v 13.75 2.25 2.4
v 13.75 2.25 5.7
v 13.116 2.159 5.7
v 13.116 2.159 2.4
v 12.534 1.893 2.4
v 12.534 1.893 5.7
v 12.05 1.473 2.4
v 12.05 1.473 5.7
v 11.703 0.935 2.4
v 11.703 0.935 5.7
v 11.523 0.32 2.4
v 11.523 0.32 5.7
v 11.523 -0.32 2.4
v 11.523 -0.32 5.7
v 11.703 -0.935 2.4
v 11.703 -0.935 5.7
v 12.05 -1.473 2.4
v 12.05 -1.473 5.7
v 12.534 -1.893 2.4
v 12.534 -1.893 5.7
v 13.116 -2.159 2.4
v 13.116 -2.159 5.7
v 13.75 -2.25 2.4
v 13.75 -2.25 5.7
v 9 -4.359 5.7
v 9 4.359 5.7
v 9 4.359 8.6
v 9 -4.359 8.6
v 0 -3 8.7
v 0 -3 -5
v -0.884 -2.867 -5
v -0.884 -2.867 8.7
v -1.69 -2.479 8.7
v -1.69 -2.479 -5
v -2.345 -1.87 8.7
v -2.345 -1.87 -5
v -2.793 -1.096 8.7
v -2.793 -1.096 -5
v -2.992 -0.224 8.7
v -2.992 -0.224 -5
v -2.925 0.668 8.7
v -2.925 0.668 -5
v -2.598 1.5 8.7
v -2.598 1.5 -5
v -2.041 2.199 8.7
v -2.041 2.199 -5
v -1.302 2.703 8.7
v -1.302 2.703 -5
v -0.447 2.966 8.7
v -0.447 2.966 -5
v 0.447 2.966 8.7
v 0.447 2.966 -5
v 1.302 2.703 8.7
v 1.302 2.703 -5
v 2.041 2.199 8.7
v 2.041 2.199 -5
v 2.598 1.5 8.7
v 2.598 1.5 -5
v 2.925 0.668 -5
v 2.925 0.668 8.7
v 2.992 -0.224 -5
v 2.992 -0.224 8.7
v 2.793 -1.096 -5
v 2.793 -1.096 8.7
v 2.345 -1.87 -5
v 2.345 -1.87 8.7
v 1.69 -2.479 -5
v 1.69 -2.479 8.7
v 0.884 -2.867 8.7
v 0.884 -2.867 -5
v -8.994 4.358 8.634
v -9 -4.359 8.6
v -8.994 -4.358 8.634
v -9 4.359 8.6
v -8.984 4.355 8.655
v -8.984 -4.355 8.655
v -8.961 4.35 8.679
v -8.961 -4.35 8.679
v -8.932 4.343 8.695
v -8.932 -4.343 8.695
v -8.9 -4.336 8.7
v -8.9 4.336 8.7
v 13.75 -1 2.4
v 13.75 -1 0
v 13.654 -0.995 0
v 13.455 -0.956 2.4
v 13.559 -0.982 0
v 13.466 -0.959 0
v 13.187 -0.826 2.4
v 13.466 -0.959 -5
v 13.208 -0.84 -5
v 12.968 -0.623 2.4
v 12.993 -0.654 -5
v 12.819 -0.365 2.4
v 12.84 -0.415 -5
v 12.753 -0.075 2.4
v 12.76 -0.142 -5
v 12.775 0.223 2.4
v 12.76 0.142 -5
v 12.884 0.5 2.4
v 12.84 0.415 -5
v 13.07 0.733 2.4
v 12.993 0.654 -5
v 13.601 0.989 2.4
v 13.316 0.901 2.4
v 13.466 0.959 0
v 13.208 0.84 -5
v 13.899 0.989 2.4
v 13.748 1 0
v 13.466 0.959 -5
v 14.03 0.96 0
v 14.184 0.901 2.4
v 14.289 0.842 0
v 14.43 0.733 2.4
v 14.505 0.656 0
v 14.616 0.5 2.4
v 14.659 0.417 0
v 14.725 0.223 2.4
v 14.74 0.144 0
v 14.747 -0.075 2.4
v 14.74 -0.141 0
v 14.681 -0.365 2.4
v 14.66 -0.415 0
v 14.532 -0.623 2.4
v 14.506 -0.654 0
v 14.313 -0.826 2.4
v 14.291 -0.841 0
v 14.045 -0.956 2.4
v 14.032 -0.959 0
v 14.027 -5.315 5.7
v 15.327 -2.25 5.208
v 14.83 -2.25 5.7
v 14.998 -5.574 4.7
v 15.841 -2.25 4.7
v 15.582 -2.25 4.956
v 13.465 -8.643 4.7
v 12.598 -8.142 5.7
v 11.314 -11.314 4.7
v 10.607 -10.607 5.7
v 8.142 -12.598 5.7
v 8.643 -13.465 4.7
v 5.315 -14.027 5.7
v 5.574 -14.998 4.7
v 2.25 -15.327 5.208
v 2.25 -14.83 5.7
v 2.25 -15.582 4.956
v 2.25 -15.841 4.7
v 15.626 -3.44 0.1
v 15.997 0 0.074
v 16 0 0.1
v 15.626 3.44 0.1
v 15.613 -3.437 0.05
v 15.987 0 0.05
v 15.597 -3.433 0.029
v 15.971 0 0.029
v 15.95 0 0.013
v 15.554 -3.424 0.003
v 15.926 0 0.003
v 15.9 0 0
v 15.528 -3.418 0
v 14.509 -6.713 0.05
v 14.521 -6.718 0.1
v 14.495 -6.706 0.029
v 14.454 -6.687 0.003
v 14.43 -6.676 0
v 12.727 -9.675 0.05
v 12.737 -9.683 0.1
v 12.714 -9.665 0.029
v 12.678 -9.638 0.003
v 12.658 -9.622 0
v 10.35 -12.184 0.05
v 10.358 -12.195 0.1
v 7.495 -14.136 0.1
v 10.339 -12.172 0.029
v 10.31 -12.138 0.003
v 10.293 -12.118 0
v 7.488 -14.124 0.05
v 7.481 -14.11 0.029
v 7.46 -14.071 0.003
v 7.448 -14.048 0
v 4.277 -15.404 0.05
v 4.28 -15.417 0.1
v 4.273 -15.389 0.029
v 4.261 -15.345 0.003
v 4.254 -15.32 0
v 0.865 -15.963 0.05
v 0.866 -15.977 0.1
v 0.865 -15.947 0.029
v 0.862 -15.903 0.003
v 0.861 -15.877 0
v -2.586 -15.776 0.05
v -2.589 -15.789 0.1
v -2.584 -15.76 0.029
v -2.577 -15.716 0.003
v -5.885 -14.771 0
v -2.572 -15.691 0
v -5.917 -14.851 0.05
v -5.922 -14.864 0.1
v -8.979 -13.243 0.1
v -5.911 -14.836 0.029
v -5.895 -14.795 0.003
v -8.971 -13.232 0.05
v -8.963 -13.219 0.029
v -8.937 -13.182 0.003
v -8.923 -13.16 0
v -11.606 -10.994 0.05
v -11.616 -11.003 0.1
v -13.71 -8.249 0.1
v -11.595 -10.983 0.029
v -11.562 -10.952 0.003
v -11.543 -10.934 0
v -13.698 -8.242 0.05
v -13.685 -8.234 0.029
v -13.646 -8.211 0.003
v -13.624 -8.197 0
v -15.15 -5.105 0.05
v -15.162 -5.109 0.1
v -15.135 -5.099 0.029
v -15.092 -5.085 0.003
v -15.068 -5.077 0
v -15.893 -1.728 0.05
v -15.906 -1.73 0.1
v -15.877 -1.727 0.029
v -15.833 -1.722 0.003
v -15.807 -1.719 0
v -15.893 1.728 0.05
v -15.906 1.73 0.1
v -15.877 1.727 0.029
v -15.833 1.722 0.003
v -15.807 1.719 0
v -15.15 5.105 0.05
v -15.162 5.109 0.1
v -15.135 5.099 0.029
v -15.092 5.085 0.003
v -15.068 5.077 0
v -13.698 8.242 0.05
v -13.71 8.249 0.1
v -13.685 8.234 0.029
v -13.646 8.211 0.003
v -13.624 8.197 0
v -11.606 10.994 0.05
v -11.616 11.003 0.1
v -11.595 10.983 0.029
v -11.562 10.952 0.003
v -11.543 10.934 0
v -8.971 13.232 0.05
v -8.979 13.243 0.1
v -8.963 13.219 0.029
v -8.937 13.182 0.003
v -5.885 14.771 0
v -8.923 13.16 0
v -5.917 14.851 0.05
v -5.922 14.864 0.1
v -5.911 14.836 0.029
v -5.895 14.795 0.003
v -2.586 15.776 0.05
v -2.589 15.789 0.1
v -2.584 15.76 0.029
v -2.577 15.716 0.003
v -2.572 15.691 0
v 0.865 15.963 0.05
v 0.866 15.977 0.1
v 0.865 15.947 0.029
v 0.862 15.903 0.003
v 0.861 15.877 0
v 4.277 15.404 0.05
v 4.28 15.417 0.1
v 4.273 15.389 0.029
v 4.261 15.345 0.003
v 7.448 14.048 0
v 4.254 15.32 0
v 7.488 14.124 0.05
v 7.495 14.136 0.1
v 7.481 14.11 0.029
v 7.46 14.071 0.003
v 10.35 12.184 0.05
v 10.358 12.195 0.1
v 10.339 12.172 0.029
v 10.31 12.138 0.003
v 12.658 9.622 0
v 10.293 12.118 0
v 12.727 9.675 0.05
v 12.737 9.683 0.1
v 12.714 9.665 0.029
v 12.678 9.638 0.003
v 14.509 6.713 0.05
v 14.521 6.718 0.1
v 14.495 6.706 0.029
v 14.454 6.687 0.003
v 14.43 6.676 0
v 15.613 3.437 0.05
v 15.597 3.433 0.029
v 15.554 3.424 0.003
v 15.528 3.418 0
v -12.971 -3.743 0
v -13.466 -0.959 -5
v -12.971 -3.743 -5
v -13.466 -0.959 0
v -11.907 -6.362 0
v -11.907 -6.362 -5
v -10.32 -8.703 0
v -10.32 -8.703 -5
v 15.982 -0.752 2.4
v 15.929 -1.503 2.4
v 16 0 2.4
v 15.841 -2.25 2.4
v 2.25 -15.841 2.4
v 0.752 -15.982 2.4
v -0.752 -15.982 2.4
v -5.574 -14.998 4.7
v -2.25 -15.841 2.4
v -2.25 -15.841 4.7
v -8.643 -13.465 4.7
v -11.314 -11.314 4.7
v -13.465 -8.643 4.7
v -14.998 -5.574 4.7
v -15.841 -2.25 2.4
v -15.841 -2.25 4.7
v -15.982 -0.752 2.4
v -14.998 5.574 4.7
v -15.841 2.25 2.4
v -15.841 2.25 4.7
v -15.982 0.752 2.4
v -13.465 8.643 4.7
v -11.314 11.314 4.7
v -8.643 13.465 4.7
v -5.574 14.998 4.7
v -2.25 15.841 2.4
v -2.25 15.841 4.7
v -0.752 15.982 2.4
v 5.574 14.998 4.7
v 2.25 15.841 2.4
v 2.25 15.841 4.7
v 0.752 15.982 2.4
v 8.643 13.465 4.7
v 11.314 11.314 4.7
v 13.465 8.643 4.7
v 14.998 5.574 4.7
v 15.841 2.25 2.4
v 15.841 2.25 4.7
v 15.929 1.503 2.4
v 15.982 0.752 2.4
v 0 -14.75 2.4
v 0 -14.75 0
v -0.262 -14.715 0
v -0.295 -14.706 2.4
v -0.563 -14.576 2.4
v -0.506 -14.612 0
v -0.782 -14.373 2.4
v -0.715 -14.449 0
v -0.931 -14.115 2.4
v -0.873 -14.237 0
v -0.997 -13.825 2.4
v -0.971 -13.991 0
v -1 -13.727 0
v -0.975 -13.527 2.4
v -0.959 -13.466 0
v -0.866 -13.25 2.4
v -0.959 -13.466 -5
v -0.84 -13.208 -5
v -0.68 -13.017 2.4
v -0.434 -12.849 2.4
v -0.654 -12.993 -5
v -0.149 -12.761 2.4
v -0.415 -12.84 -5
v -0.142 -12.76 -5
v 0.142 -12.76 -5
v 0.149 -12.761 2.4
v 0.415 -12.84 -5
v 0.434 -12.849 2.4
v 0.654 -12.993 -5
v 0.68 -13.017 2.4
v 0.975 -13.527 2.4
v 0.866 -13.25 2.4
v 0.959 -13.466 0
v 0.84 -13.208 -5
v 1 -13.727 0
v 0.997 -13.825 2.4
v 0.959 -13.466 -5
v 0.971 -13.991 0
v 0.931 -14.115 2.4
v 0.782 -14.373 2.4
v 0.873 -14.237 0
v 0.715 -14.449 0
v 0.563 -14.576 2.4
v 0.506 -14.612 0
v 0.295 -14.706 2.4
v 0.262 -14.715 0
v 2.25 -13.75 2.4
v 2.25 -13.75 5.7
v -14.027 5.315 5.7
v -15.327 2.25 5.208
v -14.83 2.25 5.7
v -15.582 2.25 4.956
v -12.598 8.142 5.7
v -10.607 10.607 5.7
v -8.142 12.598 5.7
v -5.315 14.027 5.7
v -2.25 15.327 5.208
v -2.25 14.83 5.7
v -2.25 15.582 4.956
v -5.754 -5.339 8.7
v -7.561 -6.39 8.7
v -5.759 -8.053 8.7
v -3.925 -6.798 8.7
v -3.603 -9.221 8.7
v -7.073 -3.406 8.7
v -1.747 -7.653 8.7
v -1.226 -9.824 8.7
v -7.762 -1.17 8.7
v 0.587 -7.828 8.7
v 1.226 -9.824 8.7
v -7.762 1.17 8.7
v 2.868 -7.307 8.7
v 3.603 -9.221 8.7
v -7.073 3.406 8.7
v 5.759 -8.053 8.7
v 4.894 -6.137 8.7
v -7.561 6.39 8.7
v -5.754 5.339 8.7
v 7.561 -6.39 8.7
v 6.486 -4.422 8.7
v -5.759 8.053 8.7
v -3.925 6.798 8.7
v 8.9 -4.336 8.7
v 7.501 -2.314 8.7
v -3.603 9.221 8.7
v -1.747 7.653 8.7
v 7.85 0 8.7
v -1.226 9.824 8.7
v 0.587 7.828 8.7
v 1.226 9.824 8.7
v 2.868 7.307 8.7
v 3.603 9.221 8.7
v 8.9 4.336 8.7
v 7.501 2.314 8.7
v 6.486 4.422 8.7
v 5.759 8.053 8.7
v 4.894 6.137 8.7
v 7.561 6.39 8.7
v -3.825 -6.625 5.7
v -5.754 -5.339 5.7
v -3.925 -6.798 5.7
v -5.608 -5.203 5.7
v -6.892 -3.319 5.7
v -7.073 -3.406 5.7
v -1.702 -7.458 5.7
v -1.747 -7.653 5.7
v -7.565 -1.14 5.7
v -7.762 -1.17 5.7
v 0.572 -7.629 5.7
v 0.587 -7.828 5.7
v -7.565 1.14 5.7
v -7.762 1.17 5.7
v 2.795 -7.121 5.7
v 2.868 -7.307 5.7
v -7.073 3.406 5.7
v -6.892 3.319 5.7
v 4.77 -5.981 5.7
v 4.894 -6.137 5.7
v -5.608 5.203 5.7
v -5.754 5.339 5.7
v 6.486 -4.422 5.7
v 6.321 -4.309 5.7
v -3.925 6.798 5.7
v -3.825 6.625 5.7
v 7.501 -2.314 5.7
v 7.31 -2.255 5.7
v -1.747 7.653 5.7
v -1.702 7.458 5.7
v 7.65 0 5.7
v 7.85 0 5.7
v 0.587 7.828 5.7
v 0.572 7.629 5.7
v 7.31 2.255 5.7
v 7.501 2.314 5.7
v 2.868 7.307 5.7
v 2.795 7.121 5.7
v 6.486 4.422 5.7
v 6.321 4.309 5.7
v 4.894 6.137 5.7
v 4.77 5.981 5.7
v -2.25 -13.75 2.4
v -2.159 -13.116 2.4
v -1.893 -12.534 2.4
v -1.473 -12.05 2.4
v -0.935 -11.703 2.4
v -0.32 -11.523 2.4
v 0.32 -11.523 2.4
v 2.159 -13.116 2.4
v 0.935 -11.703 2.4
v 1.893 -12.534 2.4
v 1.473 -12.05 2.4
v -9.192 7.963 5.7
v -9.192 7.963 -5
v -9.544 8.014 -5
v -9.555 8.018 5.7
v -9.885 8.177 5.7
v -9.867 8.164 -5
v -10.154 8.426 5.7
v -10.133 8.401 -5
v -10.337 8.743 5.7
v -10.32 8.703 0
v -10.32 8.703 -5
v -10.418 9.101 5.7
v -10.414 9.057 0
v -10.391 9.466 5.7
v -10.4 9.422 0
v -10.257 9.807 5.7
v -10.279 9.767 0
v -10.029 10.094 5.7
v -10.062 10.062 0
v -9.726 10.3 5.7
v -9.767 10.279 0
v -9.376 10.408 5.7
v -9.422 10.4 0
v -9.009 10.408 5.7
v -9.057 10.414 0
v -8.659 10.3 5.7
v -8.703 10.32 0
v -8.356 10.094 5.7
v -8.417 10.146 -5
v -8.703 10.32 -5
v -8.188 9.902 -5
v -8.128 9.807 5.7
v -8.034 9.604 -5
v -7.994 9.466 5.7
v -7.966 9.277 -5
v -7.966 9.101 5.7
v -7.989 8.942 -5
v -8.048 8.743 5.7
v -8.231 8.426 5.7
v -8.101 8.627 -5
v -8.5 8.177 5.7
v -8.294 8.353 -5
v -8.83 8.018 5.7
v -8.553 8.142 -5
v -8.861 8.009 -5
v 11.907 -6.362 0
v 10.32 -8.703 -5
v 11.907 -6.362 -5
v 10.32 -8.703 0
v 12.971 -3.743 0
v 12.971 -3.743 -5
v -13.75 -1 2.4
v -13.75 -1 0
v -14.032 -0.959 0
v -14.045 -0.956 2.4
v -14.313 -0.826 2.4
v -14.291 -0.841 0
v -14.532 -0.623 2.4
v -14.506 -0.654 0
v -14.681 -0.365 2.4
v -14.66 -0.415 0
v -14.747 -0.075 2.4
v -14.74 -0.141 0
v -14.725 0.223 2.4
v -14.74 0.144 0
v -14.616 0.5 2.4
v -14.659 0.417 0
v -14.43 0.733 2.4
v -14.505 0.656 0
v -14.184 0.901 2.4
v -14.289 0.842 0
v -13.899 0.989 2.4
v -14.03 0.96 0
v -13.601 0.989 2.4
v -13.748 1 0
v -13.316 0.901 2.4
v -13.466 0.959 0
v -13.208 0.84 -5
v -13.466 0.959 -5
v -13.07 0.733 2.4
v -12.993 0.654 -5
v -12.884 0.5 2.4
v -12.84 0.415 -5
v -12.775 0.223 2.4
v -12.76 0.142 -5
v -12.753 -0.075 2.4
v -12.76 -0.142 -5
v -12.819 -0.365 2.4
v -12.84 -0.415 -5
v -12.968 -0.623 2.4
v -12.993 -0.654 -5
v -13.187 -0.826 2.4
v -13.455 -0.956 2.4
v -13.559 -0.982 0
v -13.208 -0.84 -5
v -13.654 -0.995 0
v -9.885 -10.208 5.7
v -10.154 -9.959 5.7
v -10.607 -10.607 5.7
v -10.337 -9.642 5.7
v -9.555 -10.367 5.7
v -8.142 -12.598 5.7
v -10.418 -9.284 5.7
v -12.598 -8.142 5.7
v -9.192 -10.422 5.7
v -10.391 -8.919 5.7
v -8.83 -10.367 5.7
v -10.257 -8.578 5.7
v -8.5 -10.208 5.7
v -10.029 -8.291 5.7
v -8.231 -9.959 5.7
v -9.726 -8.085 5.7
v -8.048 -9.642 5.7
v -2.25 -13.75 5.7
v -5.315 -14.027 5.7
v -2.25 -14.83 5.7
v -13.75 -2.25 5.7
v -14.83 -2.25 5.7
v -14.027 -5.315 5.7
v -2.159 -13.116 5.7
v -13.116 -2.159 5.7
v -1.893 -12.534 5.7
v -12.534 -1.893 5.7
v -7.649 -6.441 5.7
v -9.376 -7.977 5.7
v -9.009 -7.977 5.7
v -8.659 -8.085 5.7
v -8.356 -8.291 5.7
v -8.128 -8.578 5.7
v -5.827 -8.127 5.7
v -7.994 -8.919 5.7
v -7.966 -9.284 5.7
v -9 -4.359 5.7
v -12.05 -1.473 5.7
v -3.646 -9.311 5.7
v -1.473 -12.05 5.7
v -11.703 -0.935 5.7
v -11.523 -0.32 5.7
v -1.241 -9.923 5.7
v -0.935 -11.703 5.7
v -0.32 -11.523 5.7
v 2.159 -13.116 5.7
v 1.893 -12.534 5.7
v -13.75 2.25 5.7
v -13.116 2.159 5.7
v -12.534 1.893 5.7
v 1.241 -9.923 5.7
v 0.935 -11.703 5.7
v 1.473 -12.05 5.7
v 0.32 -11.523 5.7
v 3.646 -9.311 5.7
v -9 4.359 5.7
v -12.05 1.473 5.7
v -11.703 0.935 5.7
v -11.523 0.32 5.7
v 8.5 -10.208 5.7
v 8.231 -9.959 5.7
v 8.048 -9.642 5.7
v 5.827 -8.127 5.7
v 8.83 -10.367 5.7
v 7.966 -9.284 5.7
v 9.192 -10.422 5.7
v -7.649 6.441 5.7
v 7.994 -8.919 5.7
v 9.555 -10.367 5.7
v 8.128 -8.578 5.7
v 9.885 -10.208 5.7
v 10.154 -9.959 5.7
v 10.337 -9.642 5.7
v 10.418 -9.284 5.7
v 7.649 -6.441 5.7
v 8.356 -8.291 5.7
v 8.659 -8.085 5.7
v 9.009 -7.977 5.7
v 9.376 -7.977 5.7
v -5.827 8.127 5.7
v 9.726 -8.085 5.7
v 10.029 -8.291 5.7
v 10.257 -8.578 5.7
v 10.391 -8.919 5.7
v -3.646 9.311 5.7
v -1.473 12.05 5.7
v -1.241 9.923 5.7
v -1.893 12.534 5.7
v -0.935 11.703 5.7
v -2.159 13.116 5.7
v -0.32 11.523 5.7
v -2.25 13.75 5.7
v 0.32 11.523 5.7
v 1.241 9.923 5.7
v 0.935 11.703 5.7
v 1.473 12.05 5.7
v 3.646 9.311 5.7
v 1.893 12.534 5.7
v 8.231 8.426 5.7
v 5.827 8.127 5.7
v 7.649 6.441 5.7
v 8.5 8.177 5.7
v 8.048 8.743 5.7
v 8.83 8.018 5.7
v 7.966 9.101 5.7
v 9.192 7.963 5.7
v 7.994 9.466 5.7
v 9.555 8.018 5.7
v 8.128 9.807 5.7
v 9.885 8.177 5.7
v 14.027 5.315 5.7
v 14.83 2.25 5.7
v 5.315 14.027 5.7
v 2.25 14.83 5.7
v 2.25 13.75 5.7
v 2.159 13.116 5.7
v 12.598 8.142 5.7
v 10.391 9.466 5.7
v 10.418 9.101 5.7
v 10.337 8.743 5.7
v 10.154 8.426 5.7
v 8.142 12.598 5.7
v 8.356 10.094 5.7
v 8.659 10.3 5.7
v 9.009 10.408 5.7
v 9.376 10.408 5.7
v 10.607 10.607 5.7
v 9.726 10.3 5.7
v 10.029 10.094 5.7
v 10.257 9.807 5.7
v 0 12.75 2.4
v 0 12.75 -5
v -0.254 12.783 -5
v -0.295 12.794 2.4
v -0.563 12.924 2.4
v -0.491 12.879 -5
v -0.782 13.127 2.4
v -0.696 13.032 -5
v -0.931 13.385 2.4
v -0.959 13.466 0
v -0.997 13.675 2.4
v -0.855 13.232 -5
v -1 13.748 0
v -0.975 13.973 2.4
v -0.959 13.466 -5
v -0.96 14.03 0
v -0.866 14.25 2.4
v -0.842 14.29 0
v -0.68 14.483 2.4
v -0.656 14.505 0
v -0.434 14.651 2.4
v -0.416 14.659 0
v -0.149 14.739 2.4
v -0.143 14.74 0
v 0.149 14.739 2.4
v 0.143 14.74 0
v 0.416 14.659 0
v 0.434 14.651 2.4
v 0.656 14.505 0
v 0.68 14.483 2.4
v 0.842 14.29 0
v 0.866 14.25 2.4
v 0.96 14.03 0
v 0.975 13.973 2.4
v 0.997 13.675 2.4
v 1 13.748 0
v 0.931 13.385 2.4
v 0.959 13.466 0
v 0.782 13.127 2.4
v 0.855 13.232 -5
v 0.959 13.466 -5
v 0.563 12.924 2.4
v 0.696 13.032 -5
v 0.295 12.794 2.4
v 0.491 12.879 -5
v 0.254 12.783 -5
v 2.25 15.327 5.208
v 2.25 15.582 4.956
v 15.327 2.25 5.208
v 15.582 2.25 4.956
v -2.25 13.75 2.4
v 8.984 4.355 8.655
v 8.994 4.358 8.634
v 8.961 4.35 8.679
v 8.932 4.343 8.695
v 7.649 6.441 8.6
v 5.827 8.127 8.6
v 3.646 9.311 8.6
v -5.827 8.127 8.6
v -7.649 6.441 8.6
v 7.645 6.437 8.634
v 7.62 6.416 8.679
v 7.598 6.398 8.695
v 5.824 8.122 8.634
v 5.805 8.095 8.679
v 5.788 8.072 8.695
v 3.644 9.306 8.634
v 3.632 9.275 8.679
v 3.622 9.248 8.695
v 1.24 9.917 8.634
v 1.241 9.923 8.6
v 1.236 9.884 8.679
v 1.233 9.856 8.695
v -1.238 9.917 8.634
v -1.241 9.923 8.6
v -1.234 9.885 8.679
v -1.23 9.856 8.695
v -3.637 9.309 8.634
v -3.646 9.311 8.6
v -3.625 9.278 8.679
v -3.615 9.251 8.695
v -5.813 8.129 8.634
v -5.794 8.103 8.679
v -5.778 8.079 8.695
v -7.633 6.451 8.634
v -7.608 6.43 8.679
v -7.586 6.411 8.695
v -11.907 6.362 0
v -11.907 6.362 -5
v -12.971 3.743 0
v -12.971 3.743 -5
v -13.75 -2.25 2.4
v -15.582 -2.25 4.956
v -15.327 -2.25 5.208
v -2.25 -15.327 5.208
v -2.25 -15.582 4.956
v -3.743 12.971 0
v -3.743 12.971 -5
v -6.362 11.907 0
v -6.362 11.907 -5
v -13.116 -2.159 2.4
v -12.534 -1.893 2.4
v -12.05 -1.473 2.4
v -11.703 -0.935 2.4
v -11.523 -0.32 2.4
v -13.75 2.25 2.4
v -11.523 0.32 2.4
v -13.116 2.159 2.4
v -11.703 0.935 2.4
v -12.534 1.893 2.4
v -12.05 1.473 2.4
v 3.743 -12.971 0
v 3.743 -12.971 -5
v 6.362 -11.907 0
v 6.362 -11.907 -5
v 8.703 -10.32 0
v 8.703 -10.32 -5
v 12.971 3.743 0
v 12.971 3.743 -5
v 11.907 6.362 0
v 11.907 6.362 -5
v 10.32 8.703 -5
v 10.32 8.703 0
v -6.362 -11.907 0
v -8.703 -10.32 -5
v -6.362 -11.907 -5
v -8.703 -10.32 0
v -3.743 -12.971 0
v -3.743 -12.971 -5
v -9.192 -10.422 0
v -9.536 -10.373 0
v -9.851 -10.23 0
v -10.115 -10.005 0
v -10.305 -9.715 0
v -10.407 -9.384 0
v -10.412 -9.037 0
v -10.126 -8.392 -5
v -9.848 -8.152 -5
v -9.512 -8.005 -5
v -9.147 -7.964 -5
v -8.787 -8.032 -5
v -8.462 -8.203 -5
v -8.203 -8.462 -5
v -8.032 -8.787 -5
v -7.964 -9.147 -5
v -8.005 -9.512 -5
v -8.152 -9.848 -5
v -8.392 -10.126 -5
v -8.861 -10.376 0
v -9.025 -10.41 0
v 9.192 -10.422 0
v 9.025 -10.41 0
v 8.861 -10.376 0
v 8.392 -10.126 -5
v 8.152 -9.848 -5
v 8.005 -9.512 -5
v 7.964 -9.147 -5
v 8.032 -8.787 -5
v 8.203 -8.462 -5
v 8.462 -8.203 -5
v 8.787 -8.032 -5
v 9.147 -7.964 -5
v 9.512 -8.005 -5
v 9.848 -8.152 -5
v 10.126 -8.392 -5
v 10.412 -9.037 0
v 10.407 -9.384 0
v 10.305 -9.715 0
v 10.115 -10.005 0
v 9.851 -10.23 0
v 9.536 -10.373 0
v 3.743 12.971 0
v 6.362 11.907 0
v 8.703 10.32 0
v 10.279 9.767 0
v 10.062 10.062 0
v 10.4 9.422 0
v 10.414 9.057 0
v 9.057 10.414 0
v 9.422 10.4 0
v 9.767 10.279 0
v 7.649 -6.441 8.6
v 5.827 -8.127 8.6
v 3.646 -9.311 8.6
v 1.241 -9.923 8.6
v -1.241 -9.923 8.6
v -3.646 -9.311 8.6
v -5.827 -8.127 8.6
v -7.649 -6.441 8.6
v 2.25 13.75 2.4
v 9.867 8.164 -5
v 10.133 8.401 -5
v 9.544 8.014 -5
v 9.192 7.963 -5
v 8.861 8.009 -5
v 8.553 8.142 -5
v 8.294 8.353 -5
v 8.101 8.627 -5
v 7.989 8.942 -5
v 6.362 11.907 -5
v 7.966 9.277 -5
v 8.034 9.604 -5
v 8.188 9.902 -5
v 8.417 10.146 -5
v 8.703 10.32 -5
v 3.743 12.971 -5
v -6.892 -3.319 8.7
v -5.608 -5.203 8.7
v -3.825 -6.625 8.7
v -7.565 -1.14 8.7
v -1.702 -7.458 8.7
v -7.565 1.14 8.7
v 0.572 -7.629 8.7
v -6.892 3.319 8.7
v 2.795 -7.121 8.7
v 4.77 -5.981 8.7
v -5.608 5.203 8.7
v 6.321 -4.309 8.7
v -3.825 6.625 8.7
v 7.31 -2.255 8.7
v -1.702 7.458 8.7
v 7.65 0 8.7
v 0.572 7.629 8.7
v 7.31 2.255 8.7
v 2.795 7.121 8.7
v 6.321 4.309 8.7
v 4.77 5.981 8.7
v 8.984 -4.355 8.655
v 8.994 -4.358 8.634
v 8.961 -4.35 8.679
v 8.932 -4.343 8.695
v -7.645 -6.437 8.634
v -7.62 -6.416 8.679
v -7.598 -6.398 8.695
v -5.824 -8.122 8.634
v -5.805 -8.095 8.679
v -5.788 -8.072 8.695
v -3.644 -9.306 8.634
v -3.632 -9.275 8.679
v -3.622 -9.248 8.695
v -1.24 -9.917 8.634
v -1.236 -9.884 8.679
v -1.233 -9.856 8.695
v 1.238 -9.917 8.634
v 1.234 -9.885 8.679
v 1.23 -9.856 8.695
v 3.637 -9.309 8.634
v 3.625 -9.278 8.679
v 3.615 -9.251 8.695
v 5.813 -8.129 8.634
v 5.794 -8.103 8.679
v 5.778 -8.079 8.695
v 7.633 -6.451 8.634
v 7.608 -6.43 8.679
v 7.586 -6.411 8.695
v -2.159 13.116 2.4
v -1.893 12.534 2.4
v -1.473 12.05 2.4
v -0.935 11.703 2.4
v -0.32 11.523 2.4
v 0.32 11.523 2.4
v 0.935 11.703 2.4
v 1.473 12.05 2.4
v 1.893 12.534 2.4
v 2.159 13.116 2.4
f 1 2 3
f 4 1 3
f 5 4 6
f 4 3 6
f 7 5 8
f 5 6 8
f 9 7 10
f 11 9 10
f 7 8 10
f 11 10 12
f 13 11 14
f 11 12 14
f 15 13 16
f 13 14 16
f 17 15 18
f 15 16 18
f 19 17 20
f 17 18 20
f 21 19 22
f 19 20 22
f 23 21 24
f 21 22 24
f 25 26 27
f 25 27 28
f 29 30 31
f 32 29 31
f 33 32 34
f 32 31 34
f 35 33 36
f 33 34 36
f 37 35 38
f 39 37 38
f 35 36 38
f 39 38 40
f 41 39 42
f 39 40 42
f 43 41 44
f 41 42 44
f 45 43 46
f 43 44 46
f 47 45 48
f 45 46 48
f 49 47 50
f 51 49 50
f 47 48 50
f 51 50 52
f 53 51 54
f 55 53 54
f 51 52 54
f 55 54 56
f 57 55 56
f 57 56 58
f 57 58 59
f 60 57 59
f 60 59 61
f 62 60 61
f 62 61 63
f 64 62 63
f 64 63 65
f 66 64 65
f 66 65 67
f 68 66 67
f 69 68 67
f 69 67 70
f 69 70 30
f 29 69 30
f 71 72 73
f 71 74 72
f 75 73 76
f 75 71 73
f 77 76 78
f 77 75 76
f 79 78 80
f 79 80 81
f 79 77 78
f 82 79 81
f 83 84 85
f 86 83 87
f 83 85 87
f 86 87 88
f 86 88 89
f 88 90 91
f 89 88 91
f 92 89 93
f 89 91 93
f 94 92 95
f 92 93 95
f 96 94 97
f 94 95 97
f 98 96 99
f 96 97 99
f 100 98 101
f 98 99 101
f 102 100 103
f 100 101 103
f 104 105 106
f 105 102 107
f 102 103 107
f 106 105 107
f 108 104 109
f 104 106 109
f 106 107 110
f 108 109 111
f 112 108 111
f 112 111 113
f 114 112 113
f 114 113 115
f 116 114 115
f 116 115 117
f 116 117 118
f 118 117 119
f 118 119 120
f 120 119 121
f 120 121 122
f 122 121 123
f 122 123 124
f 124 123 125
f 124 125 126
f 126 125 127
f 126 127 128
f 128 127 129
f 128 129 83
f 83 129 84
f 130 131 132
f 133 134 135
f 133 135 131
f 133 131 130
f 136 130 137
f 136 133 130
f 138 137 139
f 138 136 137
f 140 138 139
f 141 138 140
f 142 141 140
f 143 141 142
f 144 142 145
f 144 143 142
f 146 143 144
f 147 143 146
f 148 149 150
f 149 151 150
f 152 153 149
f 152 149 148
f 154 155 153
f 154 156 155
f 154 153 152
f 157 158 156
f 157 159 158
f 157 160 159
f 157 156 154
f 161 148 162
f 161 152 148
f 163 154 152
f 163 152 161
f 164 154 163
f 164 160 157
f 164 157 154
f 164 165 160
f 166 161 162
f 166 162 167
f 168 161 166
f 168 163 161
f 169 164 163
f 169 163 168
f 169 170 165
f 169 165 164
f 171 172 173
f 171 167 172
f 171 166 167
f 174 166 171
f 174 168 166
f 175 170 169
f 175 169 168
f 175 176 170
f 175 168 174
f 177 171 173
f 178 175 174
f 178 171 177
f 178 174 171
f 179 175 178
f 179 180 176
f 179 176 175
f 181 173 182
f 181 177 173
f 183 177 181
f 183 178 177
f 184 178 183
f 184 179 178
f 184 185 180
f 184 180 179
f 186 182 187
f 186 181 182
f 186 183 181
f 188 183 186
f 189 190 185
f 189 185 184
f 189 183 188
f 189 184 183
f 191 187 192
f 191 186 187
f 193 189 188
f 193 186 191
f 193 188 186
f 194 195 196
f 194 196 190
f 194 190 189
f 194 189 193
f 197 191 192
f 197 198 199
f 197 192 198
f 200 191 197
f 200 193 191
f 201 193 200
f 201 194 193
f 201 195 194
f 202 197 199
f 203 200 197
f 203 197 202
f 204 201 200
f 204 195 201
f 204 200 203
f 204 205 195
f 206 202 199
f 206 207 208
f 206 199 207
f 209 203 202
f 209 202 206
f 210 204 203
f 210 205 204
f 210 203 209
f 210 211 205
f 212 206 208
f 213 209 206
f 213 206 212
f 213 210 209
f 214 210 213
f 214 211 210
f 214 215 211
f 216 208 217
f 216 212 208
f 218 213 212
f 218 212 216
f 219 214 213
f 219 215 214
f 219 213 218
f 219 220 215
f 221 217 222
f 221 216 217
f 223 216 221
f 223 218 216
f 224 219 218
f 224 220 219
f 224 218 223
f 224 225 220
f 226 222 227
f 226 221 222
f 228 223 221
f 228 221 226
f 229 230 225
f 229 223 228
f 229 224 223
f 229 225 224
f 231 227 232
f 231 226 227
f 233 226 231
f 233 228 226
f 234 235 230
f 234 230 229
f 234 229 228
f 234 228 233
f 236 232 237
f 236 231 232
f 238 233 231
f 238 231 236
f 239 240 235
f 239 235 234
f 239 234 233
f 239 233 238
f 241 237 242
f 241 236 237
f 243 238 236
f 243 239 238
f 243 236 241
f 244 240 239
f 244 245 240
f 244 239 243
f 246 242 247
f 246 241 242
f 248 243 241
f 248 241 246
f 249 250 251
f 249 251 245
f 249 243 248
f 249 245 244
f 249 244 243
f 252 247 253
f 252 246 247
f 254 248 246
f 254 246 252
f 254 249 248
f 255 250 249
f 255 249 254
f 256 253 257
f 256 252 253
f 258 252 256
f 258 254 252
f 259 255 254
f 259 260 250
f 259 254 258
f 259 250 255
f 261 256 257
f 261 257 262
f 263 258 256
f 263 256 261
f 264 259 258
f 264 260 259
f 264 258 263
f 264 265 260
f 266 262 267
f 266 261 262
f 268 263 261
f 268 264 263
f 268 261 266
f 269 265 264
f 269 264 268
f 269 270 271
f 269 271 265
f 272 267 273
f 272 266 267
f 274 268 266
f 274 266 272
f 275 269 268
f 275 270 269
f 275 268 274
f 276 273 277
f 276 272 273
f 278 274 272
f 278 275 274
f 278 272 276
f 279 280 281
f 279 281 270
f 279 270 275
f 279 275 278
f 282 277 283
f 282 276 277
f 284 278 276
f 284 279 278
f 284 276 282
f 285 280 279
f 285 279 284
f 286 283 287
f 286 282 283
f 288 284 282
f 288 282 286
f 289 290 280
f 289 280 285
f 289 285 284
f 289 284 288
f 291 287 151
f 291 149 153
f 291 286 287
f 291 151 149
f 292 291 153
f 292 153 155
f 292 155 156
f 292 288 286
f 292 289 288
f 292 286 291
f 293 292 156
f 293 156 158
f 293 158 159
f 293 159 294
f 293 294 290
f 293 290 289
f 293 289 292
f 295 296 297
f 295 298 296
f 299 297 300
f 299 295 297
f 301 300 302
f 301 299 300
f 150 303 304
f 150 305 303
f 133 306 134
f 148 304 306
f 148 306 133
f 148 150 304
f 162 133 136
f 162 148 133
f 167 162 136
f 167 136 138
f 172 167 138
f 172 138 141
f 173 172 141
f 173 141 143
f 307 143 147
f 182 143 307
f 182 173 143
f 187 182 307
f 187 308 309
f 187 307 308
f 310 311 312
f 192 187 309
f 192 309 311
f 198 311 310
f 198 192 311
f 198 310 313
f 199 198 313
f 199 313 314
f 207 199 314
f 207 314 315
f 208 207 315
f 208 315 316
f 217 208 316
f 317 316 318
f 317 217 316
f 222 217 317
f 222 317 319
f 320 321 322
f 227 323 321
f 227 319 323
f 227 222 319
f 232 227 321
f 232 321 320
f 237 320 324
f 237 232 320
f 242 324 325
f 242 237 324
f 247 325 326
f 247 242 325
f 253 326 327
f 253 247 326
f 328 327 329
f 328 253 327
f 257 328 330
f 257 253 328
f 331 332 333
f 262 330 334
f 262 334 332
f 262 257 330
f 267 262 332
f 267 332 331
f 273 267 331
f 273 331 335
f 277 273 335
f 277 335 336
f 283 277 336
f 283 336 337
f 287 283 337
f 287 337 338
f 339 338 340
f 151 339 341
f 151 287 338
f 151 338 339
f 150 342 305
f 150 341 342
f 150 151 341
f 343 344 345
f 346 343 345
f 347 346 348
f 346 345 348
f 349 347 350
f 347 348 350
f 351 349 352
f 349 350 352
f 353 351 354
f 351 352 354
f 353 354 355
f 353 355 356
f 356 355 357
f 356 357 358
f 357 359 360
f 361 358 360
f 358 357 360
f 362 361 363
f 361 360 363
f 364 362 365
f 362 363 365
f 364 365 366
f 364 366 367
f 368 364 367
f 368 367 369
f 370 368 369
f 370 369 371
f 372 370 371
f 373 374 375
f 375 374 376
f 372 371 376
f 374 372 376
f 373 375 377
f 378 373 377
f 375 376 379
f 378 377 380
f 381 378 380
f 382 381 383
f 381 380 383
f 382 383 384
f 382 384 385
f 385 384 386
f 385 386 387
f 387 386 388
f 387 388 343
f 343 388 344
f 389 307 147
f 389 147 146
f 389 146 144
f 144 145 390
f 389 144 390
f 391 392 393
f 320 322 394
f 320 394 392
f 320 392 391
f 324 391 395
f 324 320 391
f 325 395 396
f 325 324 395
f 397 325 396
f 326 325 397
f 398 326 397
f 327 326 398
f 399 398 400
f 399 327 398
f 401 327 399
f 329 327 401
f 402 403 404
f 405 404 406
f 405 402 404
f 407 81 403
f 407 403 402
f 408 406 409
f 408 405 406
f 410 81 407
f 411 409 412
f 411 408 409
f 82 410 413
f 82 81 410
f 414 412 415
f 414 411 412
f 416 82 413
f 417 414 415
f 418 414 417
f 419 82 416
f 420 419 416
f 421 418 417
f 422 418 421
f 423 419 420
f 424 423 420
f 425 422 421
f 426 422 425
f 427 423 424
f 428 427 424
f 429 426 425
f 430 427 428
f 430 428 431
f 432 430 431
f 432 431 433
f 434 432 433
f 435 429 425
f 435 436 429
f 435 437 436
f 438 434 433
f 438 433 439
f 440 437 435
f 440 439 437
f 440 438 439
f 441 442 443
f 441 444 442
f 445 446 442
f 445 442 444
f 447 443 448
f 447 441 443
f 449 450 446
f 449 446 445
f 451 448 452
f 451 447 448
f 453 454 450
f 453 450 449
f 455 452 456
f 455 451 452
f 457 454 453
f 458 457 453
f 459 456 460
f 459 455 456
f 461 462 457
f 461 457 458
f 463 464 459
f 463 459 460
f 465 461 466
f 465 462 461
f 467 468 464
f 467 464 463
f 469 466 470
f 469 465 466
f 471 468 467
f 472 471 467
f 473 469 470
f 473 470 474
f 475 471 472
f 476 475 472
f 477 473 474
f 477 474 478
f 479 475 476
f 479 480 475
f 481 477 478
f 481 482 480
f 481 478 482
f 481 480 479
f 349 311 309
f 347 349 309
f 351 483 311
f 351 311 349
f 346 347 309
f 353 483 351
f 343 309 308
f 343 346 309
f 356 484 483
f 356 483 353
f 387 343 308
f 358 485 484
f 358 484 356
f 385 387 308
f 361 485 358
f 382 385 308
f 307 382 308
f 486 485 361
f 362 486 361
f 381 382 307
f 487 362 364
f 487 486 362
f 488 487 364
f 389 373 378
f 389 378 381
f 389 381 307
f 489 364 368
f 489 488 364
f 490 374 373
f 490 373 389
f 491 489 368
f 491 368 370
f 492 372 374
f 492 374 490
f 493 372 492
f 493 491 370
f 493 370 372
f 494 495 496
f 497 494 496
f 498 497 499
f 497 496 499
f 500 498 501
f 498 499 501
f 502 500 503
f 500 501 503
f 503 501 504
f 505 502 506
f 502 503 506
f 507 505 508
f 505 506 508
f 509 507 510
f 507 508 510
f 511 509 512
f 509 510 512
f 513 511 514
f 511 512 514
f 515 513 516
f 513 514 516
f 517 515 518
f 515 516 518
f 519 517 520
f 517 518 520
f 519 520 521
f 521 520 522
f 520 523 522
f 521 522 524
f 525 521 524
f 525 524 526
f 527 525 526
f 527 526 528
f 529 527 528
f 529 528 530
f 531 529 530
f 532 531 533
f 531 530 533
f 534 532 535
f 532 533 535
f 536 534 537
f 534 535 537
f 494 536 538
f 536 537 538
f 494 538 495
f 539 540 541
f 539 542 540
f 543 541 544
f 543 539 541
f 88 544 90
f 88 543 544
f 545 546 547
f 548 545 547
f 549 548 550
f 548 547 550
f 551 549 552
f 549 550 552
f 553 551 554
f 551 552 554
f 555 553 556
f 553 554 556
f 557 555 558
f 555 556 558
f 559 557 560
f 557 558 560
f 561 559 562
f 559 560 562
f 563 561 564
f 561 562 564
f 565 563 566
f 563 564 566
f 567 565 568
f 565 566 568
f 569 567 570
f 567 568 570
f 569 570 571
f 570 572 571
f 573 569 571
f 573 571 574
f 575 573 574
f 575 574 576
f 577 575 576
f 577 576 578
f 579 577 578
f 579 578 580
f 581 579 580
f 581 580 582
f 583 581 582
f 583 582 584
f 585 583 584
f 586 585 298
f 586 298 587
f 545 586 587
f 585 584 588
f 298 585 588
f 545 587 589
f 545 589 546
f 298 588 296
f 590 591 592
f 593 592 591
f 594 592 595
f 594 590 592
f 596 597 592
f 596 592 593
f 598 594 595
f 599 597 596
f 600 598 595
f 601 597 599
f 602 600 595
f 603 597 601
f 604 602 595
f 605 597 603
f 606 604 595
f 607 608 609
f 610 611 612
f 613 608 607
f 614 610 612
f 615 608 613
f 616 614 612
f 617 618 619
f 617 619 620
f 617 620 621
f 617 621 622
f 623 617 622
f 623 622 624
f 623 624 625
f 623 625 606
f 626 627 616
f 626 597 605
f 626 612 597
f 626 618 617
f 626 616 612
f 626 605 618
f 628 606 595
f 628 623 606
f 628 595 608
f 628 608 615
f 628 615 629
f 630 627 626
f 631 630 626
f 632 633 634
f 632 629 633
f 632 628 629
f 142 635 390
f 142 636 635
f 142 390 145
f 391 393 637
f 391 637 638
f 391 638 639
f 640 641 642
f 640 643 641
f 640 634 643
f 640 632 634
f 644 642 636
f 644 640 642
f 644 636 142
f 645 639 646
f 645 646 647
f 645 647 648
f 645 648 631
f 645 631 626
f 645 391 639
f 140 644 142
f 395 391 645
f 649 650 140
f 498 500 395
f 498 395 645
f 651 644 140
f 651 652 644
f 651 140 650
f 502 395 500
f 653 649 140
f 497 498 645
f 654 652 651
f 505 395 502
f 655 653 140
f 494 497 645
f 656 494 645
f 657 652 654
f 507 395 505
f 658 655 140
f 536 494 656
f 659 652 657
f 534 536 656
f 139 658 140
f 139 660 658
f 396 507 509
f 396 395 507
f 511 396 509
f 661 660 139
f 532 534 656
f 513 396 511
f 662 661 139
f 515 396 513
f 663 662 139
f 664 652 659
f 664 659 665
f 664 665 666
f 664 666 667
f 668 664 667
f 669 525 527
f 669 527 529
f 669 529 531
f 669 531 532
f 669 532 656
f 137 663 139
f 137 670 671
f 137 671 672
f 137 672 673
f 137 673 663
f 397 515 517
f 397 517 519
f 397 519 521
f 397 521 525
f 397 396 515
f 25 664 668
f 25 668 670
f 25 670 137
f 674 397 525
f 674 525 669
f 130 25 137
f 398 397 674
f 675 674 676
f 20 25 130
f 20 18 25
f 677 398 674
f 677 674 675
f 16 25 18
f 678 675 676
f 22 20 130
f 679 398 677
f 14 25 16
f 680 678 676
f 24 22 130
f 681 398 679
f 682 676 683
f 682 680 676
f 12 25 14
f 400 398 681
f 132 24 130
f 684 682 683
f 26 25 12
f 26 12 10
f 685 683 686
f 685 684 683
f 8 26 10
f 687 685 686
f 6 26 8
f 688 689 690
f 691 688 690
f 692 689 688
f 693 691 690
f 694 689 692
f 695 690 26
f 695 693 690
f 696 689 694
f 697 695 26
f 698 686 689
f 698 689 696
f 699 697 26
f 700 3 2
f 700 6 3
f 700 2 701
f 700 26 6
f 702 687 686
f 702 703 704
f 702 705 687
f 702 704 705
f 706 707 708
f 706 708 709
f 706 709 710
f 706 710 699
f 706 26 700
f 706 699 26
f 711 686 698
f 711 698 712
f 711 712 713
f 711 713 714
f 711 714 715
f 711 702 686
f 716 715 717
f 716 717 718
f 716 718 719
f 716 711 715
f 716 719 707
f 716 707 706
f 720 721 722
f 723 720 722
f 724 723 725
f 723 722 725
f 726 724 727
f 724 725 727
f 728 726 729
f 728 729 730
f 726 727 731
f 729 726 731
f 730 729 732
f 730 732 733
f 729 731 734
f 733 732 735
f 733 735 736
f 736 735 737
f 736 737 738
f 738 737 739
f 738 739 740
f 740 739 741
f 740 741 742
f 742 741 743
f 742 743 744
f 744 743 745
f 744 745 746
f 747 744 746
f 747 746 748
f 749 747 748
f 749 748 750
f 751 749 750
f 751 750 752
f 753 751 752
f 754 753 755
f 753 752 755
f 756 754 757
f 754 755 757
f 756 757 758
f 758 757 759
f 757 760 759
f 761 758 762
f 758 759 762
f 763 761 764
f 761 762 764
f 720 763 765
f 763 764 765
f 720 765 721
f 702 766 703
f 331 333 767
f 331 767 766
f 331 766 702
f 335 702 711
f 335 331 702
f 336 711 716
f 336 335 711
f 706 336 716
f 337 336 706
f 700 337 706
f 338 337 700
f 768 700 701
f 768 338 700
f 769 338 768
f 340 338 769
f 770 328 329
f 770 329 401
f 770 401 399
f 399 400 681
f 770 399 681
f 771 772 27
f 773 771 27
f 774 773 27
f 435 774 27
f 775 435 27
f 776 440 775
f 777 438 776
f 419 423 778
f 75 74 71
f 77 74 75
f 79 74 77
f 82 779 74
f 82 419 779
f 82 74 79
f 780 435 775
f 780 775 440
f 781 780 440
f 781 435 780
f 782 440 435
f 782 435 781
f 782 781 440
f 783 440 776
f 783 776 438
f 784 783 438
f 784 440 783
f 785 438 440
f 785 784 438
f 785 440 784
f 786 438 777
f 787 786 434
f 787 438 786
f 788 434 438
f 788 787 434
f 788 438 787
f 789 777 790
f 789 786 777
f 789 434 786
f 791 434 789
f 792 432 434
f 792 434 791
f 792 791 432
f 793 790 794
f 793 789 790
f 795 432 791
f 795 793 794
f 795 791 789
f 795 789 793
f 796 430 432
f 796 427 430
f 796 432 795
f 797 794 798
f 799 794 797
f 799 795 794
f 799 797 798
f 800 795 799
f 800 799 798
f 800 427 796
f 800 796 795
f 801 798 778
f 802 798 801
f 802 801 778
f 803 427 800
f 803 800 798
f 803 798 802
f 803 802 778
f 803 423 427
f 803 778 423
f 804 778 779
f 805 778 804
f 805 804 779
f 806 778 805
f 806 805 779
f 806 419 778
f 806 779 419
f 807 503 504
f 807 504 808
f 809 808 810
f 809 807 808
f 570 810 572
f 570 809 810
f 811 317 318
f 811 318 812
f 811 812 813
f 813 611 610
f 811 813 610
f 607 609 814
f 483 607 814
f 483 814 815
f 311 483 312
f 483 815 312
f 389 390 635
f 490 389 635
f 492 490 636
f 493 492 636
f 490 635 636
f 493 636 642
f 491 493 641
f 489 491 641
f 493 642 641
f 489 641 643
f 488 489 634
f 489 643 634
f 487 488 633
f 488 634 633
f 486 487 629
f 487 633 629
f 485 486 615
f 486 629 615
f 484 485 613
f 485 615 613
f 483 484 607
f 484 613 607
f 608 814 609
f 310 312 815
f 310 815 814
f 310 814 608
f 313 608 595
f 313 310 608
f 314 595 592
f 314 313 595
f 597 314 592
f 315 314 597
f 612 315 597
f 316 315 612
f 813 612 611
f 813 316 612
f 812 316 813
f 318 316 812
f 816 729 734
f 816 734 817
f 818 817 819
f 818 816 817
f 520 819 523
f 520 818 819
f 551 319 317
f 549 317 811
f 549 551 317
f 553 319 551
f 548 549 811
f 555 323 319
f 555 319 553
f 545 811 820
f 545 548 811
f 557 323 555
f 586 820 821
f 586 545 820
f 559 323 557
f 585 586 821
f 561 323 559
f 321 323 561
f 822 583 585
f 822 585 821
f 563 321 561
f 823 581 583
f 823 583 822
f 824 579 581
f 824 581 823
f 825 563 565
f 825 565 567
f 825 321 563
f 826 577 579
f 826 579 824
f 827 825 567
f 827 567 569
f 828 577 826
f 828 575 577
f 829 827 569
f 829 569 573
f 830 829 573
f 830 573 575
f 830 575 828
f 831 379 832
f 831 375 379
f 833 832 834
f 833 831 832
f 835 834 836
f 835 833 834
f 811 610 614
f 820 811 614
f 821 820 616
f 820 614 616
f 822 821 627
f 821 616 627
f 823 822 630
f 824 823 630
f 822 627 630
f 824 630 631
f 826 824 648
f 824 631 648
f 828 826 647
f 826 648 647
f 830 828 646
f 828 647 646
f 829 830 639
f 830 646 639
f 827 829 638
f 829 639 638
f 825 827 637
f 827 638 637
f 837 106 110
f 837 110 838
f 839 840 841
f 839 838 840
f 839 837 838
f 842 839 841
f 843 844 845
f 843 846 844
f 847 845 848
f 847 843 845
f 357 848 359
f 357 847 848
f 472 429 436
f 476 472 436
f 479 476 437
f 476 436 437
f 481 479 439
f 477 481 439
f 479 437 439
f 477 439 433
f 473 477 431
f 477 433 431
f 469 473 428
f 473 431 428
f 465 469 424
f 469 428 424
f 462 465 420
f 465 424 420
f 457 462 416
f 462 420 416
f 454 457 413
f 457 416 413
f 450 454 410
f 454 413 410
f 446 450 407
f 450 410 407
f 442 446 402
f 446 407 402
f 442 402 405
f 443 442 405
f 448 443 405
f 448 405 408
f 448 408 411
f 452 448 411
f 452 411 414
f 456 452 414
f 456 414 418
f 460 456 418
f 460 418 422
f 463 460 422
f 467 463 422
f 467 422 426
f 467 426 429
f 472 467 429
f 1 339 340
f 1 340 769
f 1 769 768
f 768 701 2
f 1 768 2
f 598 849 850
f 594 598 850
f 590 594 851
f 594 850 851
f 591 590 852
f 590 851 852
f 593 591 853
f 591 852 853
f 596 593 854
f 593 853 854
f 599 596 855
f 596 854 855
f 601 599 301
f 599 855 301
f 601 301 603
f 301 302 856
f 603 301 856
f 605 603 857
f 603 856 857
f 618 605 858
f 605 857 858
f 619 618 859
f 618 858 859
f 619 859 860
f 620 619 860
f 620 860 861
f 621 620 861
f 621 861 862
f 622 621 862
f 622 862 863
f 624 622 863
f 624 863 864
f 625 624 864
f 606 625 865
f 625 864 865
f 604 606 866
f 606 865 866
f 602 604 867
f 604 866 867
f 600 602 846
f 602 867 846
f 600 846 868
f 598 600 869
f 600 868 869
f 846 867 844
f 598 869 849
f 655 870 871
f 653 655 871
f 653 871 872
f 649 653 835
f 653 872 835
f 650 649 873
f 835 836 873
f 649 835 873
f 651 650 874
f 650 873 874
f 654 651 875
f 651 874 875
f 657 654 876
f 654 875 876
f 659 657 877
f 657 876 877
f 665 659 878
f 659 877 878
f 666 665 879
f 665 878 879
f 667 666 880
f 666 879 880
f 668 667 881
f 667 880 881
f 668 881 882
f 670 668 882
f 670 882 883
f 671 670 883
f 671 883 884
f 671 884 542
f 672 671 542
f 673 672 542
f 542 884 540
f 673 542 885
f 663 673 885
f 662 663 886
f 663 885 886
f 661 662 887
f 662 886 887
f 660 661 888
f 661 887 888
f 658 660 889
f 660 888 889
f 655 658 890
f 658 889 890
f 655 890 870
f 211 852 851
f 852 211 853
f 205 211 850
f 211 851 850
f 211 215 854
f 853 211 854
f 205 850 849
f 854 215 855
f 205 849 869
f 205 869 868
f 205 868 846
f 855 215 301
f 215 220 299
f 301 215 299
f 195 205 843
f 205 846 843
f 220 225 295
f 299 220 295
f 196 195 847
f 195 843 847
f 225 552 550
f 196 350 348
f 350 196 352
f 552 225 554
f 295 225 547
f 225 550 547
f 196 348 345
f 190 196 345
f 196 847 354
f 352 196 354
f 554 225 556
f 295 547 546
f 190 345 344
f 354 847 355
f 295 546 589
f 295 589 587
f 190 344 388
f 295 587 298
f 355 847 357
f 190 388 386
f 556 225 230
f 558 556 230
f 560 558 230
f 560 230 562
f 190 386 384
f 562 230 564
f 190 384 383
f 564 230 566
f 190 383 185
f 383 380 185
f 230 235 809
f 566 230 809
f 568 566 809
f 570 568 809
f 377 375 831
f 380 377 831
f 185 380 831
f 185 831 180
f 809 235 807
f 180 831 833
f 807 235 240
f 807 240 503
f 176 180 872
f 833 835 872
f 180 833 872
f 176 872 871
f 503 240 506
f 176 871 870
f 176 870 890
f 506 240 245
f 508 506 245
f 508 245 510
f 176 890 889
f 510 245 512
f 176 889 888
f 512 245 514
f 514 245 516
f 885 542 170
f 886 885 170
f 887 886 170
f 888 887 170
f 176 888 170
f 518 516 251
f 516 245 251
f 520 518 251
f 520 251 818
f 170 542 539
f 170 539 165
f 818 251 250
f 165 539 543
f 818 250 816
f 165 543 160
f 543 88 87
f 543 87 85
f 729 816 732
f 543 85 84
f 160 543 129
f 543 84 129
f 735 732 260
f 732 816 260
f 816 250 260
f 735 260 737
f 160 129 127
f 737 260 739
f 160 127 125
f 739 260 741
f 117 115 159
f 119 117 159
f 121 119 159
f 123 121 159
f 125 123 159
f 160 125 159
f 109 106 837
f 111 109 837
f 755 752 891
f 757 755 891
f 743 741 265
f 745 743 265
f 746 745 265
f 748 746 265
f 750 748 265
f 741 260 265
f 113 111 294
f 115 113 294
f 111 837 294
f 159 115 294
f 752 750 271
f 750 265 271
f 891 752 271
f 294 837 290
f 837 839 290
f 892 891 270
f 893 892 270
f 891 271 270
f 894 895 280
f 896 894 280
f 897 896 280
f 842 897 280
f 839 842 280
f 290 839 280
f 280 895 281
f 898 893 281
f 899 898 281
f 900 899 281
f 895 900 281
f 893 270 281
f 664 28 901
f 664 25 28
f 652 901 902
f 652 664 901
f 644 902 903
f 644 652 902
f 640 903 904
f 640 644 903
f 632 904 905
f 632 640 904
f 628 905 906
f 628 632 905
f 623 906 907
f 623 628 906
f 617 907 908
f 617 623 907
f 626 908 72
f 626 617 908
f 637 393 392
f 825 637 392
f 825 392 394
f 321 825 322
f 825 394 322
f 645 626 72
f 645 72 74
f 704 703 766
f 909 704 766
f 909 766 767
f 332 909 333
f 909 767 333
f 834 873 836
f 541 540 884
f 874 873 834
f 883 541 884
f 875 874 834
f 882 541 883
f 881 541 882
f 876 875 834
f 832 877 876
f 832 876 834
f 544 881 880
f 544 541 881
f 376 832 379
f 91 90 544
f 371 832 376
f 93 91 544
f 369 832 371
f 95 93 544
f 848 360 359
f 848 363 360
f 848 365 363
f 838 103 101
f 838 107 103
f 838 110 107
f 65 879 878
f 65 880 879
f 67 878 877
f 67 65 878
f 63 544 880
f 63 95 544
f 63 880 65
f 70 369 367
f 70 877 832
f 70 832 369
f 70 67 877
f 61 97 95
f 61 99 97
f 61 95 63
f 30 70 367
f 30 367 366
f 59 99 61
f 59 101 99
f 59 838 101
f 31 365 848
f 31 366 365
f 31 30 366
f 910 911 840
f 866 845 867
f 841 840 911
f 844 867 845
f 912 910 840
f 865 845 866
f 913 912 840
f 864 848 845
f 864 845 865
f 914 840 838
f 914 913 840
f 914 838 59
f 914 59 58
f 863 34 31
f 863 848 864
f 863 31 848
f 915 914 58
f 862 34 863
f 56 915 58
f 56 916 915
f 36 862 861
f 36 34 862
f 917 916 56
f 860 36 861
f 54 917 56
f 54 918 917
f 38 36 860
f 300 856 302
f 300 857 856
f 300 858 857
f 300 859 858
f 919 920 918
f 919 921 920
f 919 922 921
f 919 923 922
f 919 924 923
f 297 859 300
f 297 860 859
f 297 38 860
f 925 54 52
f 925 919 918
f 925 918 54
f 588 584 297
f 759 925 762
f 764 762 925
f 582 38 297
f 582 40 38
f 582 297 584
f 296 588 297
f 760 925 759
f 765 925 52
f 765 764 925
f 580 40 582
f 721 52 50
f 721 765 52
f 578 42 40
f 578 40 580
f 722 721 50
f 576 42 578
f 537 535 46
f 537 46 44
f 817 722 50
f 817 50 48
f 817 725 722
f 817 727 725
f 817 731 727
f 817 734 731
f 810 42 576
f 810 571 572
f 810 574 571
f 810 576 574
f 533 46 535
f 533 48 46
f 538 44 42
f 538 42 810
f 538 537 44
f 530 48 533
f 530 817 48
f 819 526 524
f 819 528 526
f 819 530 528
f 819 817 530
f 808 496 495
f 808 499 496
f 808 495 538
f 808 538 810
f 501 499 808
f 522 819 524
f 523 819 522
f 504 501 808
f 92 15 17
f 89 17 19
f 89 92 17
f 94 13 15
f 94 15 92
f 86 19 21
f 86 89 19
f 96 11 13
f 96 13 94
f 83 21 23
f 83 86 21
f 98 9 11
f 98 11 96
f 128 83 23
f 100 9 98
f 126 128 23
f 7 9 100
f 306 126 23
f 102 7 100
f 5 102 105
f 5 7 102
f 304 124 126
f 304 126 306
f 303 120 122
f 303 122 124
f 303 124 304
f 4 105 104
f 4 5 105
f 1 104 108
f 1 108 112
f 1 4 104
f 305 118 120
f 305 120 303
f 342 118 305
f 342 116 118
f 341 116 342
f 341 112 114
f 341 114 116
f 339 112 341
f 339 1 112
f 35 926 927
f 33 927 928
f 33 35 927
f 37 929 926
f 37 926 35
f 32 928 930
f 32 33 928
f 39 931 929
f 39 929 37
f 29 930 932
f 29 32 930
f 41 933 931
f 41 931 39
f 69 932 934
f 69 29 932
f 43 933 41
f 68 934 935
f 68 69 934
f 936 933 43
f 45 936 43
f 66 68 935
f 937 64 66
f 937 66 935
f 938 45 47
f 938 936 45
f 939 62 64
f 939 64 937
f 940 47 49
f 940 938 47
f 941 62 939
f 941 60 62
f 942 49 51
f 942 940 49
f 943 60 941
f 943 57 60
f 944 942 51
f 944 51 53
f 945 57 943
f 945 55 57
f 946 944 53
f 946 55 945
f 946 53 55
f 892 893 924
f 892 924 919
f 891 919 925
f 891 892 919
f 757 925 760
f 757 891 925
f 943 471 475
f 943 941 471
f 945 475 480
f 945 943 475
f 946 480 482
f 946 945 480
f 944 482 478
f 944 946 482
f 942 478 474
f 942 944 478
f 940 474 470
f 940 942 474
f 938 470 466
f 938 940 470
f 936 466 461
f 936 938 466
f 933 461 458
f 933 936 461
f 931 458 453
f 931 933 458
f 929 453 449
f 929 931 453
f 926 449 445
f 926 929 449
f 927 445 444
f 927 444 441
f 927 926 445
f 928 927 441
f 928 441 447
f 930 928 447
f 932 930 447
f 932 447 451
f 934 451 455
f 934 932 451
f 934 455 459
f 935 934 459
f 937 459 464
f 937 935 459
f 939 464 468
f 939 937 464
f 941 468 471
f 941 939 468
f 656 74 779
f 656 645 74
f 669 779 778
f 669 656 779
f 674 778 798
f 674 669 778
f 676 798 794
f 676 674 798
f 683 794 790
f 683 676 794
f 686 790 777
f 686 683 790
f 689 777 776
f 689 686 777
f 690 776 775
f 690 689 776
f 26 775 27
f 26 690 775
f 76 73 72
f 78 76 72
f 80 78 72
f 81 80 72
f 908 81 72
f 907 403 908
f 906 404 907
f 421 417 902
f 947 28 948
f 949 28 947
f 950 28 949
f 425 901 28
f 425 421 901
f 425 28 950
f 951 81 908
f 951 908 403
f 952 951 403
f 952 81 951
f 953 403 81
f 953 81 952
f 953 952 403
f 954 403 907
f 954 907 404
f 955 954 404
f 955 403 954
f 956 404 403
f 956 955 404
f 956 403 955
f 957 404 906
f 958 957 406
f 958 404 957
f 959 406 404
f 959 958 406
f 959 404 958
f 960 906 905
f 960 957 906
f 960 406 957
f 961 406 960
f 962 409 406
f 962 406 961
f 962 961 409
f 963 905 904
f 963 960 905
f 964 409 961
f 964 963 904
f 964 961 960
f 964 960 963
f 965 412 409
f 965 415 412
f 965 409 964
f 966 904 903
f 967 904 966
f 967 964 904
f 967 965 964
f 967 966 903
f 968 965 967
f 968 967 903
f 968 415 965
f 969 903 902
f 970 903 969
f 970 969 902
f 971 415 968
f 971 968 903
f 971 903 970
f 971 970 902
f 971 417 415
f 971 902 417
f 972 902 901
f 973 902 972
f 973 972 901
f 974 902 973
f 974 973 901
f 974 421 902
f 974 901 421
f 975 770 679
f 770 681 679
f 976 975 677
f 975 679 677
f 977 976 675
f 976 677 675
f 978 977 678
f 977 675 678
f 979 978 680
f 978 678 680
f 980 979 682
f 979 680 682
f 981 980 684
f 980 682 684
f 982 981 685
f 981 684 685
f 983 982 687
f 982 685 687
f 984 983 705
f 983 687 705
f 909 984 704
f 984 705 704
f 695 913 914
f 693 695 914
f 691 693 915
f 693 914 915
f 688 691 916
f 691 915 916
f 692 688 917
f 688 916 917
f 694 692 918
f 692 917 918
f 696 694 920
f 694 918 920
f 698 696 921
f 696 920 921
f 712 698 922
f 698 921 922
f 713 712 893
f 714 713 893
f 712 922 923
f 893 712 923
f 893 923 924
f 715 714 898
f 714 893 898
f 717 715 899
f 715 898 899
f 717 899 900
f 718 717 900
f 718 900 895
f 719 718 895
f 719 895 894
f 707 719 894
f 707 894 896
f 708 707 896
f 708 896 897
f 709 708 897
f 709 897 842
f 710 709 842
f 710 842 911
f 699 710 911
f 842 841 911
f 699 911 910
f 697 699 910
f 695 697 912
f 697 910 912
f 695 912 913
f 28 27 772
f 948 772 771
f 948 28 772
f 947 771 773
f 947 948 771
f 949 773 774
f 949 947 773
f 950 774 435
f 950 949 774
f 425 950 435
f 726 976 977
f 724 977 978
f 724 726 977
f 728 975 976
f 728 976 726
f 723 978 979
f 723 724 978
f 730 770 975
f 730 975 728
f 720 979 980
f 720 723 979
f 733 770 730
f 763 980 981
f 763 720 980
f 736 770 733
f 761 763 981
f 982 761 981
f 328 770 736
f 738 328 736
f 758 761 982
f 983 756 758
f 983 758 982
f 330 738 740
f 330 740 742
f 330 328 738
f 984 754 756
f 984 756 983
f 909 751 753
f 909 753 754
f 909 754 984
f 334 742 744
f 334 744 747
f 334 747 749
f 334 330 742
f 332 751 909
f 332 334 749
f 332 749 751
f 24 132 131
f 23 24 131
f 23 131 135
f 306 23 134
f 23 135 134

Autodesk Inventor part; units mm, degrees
ref_plane "YZ Plane" through (0, 0, 0) normal (1, 0, 0) x (0, 1, 0)
ref_plane "XZ Plane" through (0, 0, 0) normal (0, 1, 0) x (-1, 0, 0)
ref_plane "XY Plane" through (0, 0, 0) normal (0, 0, 1) x (1, 0, 0)
sketch "スケッチ1" plane through (0, 0, 0) normal (0, 0, 1) x (1, 0, 0)
  circle A0 centre (0, 0) radius 16
  dimension "d0" = 32
extrude "押し出し1" add sketch "スケッチ1" along normal blind 5.7
sketch "スケッチ2" plane through (0, 0, 0) normal (0, 0, -1) x (-1, 0, 0)
  circle A0 centre (0, 0) radius 13.5
  dimension "d3" = 27
extrude "押し出し2" add sketch "スケッチ2" along normal blind 5
sketch "スケッチ3" plane through (0, 0, 5.7) normal (0, 0, 1) x (1, 0, 0)
  circle A0 centre (0, 0) radius 10
  line L0 (-9, 4.3589) -> (9, 4.3589) construction
  line L1 (9, 4.3589) -> (9, -4.3589)
  line L2 (9, -4.3589) -> (-9, -4.3589) construction
  line L3 (-9, -4.3589) -> (-9, 4.3589)
  dimension "d6" = 20
  dimension "d7" = 18
extrude "押し出し3" add sketch "スケッチ3" along normal blind 3 contours L1 A0 L3
sketch "スケッチ4" plane through (0, 0, 8.7) normal (0, 0, 1) x (1, 0, 0)
  point P0 (0, 0)
  point P1 (0, 0)
hole "穴1" at (0, 0, 8.7) direction (0, 0, -1) diameter 6 end through all
sketch "スケッチ5" plane through (0, 0, 5.7) normal (0, 0, 1) x (1, 0, 0)
  circle A0 centre (0, 13.75) radius 2.25
  line L0 (-2.25, 13.75) -> (2.25, 13.75)
  line L1 (2.25, 13.75) -> (2.25, 16)
  line L2 (2.25, 16) -> (-2.25, 16)
  line L3 (-2.25, 16) -> (-2.25, 13.75)
  circle A1 centre (0, 0) radius 16 projected
  circle A2 centre (-13.75, 0) radius 2.25
  line L4 (-13.75, -2.25) -> (-13.75, 2.25)
  line L5 (-13.75, 2.25) -> (-16, 2.25)
  line L6 (-16, 2.25) -> (-16, -2.25)
  line L7 (-16, -2.25) -> (-13.75, -2.25)
  circle A3 centre (0, -13.75) radius 2.25
  line L8 (2.25, -13.75) -> (-2.25, -13.75)
  line L9 (-2.25, -13.75) -> (-2.25, -16)
  line L10 (-2.25, -16) -> (2.25, -16)
  line L11 (2.25, -16) -> (2.25, -13.75)
  circle A4 centre (13.75, 0) radius 2.25
  line L12 (13.75, 2.25) -> (13.75, -2.25)
  line L13 (13.75, -2.25) -> (16, -2.25)
  line L14 (16, -2.25) -> (16, 2.25)
  line L15 (16, 2.25) -> (13.75, 2.25)
  point P0 (-15.841, -2.25)
  point P1 (-15.841, 2.25)
  point P2 (2.25, -15.841)
  point P3 (-2.25, -15.841)
  point P4 (15.841, -2.25)
  point P5 (15.841, 2.25)
  point P6 (2.25, 15.841)
  point P7 (-2.25, 15.841)
  dimension "d17" = 4.5
  dimension "d18" = 13.75
  dimension "d21" = 360
extrude "押し出し4" cut sketch "スケッチ5" against normal blind 3.3 contours L0 A0 | L3 A1 A0 | A0 L0 | A0 A1 L1 | L5 A2 A1 | A1 A4 L15 | A2 L7 A1 | A2 L4 | A2 L4 | A4 L12 | A1 L13 A4 | L12 A4 | L9 A3 A1 | A1 A3 L11 | A3 L8 | A3 L8
sketch "スケッチ6" plane through (0, 0, 2.4) normal (0, 0, 1) x (1, 0, 0)
  arc A0 (-2.25, 13.75) -> (2.25, 13.75) centre (0, 13.75) ccw projected
  arc A1 (13.75, 2.25) -> (13.75, -2.25) centre (13.75, 0) ccw projected
  arc A2 (2.25, -13.75) -> (-2.25, -13.75) centre (0, -13.75) ccw projected
  arc A3 (-13.75, -2.25) -> (-13.75, 2.25) centre (-13.75, 0) ccw projected
  point P0 (0, 0)
hole "穴2" at (0, 13.75, 2.4) at (13.75, 0, 2.4) at (0, -13.75, 2.4) at (-13.75, 0, 2.4) direction (0, 0, -1) diameter 2 end through all
sketch "スケッチ7" plane through (0, 0, 5.7) normal (0, 0, 1) x (1, 0, 0)
  line L0 (9.1924, 9.1924) -> (0, 0) construction
  line L1 (-22.4, 0) -> (22.4, 0) projected
  point P0 (-9.1924, 9.1924)
  point P1 (-9.1924, -9.1924)
  point P2 (9.1924, -9.1924)
  dimension "d32" = 45
  dimension "d33" = 13
  dimension "d36" = 360
hole "穴3" at (9.1924, 9.1924, 5.7) at (-9.1924, 9.1924, 5.7) at (-9.1924, -9.1924, 5.7) at (9.1924, -9.1924, 5.7) direction (0, 0, -1) diameter 2.459 end through all thread size "M3x0.5" class "6H" standard "ISO Metric profile"
sketch "スケッチ8" plane through (0, 0, 8.7) normal (0, 0, 1) x (1, 0, 0)
  circle A0 centre (0, 0) radius 3 projected
  circle A1 centre (0, 0) radius 7.65
  circle A2 centre (0, 0) radius 7.85
  dimension "d45" = 15.3
  dimension "d46" = 15.7
extrude "押し出し5" cut sketch "スケッチ8" against normal up to surface (3 mm away) contours A2
chamfer "面取り1" distance 1 angle 45 4 edges at (11.3137, -11.3137, 5.7) (-11.3137, -11.3137, 5.7) (-11.3137, 11.3137, 5.7) (11.3137, 11.3137, 5.7)
fillet "フィレット1" radius 0.1 5 edges at (-16, 0, 0) (0, -10, 8.7) (9, 0, 8.7) (0, 10, 8.7) (-9, 0, 8.7)
properties part number "555_GearBox_FrontCover"
